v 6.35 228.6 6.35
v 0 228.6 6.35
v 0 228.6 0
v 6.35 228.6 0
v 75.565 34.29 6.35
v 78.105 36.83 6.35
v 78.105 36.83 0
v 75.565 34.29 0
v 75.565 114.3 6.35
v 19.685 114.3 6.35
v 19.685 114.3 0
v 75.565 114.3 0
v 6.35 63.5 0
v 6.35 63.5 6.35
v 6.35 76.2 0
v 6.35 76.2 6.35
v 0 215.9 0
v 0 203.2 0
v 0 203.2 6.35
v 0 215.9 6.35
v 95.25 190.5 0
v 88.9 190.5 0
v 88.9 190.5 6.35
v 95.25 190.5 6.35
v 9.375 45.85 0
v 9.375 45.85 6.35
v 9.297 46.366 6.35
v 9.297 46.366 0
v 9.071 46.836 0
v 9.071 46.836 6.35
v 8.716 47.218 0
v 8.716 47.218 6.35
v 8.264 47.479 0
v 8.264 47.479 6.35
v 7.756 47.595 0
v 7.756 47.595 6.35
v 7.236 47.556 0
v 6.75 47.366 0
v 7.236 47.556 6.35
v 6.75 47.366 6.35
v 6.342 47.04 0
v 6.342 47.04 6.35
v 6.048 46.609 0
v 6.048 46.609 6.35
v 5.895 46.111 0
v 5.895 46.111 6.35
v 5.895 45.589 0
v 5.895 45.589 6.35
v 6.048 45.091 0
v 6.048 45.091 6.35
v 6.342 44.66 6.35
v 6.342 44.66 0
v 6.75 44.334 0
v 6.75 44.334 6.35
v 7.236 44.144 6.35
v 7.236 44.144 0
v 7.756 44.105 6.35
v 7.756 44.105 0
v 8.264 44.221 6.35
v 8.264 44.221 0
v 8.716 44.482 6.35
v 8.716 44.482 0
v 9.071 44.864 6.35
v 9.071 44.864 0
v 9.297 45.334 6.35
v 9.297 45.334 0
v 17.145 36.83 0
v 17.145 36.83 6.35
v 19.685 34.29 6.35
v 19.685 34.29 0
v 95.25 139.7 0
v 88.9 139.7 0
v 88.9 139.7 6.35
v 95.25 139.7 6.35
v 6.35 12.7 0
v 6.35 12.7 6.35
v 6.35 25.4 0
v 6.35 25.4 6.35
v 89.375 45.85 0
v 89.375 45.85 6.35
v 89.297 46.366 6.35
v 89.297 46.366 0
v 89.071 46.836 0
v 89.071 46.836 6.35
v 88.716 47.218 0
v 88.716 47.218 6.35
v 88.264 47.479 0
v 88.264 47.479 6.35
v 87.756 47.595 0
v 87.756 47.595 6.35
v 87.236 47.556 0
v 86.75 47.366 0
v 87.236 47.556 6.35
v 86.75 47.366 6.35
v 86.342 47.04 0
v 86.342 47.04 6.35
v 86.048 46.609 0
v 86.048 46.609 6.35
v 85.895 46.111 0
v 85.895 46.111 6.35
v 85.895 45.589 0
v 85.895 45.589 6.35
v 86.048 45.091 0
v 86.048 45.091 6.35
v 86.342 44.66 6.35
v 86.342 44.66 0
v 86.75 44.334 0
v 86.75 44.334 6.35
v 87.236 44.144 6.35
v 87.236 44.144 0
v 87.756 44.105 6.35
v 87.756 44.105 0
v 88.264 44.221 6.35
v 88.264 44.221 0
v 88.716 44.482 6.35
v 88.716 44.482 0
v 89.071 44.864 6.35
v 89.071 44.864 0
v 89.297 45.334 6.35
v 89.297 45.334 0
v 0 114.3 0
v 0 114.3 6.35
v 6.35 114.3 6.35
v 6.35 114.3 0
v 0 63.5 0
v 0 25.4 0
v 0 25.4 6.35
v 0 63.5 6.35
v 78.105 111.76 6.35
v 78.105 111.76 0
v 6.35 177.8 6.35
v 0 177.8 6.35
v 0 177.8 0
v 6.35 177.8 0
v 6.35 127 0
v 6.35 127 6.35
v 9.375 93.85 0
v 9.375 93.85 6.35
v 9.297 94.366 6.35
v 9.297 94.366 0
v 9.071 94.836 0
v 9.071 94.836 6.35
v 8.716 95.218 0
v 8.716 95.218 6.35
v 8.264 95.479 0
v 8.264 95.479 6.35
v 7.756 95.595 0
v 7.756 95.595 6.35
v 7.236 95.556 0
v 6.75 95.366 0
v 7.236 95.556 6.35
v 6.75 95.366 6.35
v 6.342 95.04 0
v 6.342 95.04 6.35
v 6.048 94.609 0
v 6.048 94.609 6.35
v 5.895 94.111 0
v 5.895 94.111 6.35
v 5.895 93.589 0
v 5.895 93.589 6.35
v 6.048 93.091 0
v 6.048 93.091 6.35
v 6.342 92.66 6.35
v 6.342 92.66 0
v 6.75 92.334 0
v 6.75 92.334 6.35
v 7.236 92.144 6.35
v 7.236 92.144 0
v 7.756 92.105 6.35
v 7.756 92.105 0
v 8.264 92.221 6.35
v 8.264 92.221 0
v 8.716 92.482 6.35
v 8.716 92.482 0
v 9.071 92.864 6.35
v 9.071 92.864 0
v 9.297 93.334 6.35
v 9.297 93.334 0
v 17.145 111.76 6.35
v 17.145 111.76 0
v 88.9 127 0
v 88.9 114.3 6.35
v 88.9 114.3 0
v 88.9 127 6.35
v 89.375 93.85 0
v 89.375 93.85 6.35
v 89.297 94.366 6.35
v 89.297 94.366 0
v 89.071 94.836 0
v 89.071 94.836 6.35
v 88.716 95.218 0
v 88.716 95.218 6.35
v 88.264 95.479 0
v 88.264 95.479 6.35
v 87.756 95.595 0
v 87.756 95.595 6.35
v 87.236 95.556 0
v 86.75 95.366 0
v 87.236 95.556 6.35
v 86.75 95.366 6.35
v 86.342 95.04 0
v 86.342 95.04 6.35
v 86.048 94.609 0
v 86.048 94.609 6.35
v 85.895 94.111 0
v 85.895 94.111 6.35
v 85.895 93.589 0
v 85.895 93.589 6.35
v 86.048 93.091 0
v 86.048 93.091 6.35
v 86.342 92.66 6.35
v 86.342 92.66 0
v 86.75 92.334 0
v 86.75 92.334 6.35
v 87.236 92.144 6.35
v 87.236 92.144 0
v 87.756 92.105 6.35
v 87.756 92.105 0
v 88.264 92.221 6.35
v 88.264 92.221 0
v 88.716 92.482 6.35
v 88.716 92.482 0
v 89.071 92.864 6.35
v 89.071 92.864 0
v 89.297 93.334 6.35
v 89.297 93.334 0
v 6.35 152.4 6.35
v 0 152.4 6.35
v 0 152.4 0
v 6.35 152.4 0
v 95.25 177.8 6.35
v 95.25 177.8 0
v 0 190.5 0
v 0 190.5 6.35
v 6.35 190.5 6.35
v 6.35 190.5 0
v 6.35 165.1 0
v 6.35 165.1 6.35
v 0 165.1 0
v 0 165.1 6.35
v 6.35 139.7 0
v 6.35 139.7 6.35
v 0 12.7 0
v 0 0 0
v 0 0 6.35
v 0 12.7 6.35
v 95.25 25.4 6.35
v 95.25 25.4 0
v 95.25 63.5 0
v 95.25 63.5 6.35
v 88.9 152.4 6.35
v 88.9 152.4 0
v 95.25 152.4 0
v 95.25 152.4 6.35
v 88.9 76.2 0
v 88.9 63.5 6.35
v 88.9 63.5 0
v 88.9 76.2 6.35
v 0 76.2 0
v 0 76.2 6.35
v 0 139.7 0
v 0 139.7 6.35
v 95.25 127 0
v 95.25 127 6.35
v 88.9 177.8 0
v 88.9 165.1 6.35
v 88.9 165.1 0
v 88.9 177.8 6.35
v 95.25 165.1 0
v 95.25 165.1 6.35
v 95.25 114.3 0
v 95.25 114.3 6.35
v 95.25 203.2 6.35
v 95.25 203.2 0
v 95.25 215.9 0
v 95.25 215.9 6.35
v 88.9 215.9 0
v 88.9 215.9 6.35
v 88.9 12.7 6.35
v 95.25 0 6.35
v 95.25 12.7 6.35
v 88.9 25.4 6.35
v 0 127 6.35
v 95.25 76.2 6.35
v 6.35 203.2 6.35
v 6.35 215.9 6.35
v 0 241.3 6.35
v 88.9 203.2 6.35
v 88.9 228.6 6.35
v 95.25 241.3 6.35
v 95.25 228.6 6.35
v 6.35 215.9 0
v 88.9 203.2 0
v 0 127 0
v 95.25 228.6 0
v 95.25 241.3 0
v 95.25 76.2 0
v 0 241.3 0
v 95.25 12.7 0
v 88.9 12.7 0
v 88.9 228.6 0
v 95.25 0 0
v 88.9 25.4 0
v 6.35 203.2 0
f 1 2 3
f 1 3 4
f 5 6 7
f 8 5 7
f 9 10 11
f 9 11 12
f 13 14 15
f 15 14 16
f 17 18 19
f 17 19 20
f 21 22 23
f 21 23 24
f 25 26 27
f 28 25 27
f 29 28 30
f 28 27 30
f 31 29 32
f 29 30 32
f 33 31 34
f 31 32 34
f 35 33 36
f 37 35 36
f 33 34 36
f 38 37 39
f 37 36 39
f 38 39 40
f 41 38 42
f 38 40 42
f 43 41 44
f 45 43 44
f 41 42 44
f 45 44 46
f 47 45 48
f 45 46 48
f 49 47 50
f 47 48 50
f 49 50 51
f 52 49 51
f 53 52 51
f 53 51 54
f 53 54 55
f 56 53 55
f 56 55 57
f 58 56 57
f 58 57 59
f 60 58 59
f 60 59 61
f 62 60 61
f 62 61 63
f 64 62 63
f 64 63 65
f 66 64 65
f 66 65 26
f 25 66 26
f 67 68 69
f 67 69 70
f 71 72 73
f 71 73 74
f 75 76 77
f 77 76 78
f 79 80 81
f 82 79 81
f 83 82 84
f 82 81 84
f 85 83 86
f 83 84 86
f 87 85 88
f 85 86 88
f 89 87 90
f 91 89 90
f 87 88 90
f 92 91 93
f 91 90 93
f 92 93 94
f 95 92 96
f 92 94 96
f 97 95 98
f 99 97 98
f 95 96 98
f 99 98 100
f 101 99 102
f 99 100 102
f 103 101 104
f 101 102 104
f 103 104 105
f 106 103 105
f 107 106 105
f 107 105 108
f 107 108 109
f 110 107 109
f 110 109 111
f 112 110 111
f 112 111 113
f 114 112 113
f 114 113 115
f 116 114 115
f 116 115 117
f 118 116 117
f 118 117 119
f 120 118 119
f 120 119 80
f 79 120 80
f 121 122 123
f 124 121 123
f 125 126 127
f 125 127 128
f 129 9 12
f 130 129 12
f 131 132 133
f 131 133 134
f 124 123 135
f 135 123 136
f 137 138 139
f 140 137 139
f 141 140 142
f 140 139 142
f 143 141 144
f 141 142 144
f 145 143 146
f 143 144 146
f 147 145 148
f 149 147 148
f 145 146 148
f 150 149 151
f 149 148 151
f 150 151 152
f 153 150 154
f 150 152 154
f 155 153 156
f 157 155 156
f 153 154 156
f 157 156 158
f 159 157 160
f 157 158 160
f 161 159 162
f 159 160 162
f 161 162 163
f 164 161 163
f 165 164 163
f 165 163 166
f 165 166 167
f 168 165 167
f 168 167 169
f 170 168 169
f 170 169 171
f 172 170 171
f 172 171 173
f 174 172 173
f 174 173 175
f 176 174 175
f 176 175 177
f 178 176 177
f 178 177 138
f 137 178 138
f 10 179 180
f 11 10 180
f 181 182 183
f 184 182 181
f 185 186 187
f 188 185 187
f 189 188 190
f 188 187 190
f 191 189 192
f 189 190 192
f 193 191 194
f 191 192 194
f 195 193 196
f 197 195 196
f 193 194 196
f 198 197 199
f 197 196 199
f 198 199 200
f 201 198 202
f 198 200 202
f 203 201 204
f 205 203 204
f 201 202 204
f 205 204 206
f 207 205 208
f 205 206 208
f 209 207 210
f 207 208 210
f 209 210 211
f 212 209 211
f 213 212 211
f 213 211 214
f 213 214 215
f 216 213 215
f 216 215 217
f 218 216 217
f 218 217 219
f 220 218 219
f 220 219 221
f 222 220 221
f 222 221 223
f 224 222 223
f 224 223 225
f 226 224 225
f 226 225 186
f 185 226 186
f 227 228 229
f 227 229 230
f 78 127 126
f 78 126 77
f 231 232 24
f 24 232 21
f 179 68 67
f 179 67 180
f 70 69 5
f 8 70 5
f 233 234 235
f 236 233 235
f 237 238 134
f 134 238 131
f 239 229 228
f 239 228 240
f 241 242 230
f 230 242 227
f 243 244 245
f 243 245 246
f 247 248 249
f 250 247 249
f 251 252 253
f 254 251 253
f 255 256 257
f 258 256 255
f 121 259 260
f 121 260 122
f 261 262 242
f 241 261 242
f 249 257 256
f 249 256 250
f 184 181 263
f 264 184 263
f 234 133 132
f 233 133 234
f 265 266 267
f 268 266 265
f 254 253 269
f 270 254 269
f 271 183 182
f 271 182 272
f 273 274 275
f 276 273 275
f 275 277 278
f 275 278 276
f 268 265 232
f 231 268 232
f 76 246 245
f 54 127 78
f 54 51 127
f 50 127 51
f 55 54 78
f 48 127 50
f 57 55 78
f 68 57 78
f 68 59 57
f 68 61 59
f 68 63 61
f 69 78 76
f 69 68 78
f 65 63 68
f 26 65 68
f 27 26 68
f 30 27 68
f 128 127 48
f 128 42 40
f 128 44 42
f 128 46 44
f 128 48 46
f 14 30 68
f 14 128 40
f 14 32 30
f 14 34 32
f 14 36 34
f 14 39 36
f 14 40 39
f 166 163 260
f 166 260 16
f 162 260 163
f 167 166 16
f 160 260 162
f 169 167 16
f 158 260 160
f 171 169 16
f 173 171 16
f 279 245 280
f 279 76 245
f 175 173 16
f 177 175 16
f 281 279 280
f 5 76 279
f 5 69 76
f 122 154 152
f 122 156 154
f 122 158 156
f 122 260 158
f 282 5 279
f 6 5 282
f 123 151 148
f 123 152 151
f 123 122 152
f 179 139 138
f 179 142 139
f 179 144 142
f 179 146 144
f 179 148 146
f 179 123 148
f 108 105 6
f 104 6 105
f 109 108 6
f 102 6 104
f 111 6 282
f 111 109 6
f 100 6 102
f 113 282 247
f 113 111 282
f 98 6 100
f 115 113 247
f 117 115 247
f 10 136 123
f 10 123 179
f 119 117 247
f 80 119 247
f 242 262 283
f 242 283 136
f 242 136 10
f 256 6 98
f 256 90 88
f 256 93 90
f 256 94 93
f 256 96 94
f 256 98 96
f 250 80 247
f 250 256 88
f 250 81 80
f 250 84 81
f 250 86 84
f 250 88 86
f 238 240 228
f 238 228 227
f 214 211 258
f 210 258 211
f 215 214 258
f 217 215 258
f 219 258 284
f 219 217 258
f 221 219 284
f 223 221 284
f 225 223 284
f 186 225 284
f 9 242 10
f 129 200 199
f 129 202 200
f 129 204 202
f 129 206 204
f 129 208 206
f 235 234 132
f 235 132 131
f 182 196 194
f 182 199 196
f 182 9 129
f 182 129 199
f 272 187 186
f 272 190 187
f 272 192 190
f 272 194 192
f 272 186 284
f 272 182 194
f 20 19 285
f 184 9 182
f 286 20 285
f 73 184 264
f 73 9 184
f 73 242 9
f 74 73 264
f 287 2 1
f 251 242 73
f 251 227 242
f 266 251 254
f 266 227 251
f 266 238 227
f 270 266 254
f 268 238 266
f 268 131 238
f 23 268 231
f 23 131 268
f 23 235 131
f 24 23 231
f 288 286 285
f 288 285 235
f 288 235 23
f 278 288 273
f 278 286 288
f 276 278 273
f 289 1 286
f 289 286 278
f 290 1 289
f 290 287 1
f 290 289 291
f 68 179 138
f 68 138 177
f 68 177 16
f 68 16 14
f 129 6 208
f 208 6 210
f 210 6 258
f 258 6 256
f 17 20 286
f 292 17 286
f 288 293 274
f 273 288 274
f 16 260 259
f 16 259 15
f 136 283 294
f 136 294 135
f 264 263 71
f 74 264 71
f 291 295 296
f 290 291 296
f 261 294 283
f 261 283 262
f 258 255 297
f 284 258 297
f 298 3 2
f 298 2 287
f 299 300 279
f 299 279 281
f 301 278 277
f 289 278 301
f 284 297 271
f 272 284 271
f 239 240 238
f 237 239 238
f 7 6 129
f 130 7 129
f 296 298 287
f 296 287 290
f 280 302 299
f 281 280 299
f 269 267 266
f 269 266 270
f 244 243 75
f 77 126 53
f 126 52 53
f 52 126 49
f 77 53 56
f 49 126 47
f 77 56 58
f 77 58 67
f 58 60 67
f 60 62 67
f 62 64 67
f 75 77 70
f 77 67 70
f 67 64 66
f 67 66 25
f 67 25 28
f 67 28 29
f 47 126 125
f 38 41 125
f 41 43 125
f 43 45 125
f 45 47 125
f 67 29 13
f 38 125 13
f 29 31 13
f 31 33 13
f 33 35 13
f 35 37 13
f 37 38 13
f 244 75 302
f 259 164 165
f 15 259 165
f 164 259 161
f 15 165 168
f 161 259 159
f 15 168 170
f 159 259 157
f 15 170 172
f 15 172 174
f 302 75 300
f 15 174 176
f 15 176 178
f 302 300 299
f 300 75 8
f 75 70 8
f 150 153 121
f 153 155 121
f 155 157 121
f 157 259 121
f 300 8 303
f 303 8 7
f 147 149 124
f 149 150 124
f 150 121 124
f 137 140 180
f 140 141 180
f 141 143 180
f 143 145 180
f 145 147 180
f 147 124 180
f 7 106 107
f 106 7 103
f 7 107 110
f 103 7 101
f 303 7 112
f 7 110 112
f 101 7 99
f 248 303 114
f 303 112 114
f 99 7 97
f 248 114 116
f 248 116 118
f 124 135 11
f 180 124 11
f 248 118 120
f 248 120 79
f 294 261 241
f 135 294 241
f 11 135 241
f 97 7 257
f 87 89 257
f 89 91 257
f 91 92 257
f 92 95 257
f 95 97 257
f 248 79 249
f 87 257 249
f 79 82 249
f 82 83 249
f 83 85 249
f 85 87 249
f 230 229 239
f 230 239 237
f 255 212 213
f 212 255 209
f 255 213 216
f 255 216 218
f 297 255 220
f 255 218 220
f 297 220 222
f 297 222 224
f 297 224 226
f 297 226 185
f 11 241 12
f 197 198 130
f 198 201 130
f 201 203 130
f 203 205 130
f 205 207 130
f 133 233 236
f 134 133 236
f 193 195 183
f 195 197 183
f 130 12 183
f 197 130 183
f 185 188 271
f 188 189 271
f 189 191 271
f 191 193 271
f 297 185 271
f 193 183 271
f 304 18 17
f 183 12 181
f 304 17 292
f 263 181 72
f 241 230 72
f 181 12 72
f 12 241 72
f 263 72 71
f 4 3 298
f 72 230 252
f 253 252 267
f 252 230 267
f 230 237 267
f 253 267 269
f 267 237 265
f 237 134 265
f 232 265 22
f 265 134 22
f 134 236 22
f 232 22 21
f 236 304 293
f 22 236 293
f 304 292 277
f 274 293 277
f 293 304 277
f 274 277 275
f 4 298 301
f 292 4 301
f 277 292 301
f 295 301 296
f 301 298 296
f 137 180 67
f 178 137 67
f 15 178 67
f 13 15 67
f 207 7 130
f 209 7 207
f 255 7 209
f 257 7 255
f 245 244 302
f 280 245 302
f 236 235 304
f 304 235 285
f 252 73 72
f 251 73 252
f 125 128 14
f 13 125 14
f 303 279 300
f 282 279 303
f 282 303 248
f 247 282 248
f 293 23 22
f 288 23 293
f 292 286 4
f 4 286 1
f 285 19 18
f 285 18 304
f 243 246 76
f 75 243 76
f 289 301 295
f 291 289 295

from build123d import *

# Parameters (mm, degrees)
SKETCH1_W           = 95.25
SKETCH1_H           = 241.3
BOSS_EXTRUDE1_DEPTH = 6.35
SKETCH2_W           = 6.35
SKETCH2_H           = 12.7
CUT_EXTRUDE1_DEPTH  = 7.35
LPATTERN1_COUNT     = 9
LPATTERN1_PITCH     = 25.4
SKETCH3_R           = 1.75
CUT_EXTRUDE2_DEPTH  = 7.35
SKETCH4_W           = 60.96
SKETCH4_H           = 80.01
CUT_EXTRUDE3_DEPTH  = 7.35
CHAMFER1_SIZE       = 2.54


with BuildPart() as part:
    # Sketch1 → Boss-Extrude1 (new body)
    with BuildSketch(Plane.XY):
        with Locations((47.625, 120.65)):
            Rectangle(SKETCH1_W, SKETCH1_H)
    extrude(amount=BOSS_EXTRUDE1_DEPTH)

    # Sketch2 → Cut-Extrude1 (cut, through all)
    with BuildSketch(Plane.XY.offset(6.35)):
        with Locations((3.175, 222.25)):
            Rectangle(SKETCH2_W, SKETCH2_H)
        with Locations((92.075, 222.25)):
            Rectangle(SKETCH2_W, SKETCH2_H)
    cut_extrude1 = extrude(amount=-CUT_EXTRUDE1_DEPTH, mode=Mode.SUBTRACT)

    # LPattern1: Cut-Extrude1 ×9, 2 skipped
    with Locations(*[(0, -i * LPATTERN1_PITCH, 0) for i in range(1, LPATTERN1_COUNT) if i not in (5, 7)]):
        add(cut_extrude1, mode=Mode.SUBTRACT)

    # Sketch3 → Cut-Extrude2 (cut, through all)
    with BuildSketch(Plane.XY.offset(6.35)):
        with Locations((7.625, 93.85)):
            Circle(SKETCH3_R)
        with Locations((7.625, 45.85)):
            Circle(SKETCH3_R)
        with Locations((87.625, 93.85)):
            Circle(SKETCH3_R)
        with Locations((87.625, 45.85)):
            Circle(SKETCH3_R)
    extrude(amount=-CUT_EXTRUDE2_DEPTH, mode=Mode.SUBTRACT)

    # Sketch4 → Cut-Extrude3 (cut, through all)
    with BuildSketch(Plane.XY.offset(6.35)):
        with Locations((47.625, 74.295)):
            Rectangle(SKETCH4_W, SKETCH4_H)
    extrude(amount=-CUT_EXTRUDE3_DEPTH, mode=Mode.SUBTRACT)

    # Chamfer1
    chamfer1_edges = [part.edges().sort_by_distance(p)[0] for p in [
        (17.145, 114.3, 3.175),
        (78.105, 114.3, 3.175),
        (78.105, 34.29, 3.175),
        (17.145, 34.29, 3.175),
    ]]
    chamfer(chamfer1_edges, length=CHAMFER1_SIZE)


solid = part.part
